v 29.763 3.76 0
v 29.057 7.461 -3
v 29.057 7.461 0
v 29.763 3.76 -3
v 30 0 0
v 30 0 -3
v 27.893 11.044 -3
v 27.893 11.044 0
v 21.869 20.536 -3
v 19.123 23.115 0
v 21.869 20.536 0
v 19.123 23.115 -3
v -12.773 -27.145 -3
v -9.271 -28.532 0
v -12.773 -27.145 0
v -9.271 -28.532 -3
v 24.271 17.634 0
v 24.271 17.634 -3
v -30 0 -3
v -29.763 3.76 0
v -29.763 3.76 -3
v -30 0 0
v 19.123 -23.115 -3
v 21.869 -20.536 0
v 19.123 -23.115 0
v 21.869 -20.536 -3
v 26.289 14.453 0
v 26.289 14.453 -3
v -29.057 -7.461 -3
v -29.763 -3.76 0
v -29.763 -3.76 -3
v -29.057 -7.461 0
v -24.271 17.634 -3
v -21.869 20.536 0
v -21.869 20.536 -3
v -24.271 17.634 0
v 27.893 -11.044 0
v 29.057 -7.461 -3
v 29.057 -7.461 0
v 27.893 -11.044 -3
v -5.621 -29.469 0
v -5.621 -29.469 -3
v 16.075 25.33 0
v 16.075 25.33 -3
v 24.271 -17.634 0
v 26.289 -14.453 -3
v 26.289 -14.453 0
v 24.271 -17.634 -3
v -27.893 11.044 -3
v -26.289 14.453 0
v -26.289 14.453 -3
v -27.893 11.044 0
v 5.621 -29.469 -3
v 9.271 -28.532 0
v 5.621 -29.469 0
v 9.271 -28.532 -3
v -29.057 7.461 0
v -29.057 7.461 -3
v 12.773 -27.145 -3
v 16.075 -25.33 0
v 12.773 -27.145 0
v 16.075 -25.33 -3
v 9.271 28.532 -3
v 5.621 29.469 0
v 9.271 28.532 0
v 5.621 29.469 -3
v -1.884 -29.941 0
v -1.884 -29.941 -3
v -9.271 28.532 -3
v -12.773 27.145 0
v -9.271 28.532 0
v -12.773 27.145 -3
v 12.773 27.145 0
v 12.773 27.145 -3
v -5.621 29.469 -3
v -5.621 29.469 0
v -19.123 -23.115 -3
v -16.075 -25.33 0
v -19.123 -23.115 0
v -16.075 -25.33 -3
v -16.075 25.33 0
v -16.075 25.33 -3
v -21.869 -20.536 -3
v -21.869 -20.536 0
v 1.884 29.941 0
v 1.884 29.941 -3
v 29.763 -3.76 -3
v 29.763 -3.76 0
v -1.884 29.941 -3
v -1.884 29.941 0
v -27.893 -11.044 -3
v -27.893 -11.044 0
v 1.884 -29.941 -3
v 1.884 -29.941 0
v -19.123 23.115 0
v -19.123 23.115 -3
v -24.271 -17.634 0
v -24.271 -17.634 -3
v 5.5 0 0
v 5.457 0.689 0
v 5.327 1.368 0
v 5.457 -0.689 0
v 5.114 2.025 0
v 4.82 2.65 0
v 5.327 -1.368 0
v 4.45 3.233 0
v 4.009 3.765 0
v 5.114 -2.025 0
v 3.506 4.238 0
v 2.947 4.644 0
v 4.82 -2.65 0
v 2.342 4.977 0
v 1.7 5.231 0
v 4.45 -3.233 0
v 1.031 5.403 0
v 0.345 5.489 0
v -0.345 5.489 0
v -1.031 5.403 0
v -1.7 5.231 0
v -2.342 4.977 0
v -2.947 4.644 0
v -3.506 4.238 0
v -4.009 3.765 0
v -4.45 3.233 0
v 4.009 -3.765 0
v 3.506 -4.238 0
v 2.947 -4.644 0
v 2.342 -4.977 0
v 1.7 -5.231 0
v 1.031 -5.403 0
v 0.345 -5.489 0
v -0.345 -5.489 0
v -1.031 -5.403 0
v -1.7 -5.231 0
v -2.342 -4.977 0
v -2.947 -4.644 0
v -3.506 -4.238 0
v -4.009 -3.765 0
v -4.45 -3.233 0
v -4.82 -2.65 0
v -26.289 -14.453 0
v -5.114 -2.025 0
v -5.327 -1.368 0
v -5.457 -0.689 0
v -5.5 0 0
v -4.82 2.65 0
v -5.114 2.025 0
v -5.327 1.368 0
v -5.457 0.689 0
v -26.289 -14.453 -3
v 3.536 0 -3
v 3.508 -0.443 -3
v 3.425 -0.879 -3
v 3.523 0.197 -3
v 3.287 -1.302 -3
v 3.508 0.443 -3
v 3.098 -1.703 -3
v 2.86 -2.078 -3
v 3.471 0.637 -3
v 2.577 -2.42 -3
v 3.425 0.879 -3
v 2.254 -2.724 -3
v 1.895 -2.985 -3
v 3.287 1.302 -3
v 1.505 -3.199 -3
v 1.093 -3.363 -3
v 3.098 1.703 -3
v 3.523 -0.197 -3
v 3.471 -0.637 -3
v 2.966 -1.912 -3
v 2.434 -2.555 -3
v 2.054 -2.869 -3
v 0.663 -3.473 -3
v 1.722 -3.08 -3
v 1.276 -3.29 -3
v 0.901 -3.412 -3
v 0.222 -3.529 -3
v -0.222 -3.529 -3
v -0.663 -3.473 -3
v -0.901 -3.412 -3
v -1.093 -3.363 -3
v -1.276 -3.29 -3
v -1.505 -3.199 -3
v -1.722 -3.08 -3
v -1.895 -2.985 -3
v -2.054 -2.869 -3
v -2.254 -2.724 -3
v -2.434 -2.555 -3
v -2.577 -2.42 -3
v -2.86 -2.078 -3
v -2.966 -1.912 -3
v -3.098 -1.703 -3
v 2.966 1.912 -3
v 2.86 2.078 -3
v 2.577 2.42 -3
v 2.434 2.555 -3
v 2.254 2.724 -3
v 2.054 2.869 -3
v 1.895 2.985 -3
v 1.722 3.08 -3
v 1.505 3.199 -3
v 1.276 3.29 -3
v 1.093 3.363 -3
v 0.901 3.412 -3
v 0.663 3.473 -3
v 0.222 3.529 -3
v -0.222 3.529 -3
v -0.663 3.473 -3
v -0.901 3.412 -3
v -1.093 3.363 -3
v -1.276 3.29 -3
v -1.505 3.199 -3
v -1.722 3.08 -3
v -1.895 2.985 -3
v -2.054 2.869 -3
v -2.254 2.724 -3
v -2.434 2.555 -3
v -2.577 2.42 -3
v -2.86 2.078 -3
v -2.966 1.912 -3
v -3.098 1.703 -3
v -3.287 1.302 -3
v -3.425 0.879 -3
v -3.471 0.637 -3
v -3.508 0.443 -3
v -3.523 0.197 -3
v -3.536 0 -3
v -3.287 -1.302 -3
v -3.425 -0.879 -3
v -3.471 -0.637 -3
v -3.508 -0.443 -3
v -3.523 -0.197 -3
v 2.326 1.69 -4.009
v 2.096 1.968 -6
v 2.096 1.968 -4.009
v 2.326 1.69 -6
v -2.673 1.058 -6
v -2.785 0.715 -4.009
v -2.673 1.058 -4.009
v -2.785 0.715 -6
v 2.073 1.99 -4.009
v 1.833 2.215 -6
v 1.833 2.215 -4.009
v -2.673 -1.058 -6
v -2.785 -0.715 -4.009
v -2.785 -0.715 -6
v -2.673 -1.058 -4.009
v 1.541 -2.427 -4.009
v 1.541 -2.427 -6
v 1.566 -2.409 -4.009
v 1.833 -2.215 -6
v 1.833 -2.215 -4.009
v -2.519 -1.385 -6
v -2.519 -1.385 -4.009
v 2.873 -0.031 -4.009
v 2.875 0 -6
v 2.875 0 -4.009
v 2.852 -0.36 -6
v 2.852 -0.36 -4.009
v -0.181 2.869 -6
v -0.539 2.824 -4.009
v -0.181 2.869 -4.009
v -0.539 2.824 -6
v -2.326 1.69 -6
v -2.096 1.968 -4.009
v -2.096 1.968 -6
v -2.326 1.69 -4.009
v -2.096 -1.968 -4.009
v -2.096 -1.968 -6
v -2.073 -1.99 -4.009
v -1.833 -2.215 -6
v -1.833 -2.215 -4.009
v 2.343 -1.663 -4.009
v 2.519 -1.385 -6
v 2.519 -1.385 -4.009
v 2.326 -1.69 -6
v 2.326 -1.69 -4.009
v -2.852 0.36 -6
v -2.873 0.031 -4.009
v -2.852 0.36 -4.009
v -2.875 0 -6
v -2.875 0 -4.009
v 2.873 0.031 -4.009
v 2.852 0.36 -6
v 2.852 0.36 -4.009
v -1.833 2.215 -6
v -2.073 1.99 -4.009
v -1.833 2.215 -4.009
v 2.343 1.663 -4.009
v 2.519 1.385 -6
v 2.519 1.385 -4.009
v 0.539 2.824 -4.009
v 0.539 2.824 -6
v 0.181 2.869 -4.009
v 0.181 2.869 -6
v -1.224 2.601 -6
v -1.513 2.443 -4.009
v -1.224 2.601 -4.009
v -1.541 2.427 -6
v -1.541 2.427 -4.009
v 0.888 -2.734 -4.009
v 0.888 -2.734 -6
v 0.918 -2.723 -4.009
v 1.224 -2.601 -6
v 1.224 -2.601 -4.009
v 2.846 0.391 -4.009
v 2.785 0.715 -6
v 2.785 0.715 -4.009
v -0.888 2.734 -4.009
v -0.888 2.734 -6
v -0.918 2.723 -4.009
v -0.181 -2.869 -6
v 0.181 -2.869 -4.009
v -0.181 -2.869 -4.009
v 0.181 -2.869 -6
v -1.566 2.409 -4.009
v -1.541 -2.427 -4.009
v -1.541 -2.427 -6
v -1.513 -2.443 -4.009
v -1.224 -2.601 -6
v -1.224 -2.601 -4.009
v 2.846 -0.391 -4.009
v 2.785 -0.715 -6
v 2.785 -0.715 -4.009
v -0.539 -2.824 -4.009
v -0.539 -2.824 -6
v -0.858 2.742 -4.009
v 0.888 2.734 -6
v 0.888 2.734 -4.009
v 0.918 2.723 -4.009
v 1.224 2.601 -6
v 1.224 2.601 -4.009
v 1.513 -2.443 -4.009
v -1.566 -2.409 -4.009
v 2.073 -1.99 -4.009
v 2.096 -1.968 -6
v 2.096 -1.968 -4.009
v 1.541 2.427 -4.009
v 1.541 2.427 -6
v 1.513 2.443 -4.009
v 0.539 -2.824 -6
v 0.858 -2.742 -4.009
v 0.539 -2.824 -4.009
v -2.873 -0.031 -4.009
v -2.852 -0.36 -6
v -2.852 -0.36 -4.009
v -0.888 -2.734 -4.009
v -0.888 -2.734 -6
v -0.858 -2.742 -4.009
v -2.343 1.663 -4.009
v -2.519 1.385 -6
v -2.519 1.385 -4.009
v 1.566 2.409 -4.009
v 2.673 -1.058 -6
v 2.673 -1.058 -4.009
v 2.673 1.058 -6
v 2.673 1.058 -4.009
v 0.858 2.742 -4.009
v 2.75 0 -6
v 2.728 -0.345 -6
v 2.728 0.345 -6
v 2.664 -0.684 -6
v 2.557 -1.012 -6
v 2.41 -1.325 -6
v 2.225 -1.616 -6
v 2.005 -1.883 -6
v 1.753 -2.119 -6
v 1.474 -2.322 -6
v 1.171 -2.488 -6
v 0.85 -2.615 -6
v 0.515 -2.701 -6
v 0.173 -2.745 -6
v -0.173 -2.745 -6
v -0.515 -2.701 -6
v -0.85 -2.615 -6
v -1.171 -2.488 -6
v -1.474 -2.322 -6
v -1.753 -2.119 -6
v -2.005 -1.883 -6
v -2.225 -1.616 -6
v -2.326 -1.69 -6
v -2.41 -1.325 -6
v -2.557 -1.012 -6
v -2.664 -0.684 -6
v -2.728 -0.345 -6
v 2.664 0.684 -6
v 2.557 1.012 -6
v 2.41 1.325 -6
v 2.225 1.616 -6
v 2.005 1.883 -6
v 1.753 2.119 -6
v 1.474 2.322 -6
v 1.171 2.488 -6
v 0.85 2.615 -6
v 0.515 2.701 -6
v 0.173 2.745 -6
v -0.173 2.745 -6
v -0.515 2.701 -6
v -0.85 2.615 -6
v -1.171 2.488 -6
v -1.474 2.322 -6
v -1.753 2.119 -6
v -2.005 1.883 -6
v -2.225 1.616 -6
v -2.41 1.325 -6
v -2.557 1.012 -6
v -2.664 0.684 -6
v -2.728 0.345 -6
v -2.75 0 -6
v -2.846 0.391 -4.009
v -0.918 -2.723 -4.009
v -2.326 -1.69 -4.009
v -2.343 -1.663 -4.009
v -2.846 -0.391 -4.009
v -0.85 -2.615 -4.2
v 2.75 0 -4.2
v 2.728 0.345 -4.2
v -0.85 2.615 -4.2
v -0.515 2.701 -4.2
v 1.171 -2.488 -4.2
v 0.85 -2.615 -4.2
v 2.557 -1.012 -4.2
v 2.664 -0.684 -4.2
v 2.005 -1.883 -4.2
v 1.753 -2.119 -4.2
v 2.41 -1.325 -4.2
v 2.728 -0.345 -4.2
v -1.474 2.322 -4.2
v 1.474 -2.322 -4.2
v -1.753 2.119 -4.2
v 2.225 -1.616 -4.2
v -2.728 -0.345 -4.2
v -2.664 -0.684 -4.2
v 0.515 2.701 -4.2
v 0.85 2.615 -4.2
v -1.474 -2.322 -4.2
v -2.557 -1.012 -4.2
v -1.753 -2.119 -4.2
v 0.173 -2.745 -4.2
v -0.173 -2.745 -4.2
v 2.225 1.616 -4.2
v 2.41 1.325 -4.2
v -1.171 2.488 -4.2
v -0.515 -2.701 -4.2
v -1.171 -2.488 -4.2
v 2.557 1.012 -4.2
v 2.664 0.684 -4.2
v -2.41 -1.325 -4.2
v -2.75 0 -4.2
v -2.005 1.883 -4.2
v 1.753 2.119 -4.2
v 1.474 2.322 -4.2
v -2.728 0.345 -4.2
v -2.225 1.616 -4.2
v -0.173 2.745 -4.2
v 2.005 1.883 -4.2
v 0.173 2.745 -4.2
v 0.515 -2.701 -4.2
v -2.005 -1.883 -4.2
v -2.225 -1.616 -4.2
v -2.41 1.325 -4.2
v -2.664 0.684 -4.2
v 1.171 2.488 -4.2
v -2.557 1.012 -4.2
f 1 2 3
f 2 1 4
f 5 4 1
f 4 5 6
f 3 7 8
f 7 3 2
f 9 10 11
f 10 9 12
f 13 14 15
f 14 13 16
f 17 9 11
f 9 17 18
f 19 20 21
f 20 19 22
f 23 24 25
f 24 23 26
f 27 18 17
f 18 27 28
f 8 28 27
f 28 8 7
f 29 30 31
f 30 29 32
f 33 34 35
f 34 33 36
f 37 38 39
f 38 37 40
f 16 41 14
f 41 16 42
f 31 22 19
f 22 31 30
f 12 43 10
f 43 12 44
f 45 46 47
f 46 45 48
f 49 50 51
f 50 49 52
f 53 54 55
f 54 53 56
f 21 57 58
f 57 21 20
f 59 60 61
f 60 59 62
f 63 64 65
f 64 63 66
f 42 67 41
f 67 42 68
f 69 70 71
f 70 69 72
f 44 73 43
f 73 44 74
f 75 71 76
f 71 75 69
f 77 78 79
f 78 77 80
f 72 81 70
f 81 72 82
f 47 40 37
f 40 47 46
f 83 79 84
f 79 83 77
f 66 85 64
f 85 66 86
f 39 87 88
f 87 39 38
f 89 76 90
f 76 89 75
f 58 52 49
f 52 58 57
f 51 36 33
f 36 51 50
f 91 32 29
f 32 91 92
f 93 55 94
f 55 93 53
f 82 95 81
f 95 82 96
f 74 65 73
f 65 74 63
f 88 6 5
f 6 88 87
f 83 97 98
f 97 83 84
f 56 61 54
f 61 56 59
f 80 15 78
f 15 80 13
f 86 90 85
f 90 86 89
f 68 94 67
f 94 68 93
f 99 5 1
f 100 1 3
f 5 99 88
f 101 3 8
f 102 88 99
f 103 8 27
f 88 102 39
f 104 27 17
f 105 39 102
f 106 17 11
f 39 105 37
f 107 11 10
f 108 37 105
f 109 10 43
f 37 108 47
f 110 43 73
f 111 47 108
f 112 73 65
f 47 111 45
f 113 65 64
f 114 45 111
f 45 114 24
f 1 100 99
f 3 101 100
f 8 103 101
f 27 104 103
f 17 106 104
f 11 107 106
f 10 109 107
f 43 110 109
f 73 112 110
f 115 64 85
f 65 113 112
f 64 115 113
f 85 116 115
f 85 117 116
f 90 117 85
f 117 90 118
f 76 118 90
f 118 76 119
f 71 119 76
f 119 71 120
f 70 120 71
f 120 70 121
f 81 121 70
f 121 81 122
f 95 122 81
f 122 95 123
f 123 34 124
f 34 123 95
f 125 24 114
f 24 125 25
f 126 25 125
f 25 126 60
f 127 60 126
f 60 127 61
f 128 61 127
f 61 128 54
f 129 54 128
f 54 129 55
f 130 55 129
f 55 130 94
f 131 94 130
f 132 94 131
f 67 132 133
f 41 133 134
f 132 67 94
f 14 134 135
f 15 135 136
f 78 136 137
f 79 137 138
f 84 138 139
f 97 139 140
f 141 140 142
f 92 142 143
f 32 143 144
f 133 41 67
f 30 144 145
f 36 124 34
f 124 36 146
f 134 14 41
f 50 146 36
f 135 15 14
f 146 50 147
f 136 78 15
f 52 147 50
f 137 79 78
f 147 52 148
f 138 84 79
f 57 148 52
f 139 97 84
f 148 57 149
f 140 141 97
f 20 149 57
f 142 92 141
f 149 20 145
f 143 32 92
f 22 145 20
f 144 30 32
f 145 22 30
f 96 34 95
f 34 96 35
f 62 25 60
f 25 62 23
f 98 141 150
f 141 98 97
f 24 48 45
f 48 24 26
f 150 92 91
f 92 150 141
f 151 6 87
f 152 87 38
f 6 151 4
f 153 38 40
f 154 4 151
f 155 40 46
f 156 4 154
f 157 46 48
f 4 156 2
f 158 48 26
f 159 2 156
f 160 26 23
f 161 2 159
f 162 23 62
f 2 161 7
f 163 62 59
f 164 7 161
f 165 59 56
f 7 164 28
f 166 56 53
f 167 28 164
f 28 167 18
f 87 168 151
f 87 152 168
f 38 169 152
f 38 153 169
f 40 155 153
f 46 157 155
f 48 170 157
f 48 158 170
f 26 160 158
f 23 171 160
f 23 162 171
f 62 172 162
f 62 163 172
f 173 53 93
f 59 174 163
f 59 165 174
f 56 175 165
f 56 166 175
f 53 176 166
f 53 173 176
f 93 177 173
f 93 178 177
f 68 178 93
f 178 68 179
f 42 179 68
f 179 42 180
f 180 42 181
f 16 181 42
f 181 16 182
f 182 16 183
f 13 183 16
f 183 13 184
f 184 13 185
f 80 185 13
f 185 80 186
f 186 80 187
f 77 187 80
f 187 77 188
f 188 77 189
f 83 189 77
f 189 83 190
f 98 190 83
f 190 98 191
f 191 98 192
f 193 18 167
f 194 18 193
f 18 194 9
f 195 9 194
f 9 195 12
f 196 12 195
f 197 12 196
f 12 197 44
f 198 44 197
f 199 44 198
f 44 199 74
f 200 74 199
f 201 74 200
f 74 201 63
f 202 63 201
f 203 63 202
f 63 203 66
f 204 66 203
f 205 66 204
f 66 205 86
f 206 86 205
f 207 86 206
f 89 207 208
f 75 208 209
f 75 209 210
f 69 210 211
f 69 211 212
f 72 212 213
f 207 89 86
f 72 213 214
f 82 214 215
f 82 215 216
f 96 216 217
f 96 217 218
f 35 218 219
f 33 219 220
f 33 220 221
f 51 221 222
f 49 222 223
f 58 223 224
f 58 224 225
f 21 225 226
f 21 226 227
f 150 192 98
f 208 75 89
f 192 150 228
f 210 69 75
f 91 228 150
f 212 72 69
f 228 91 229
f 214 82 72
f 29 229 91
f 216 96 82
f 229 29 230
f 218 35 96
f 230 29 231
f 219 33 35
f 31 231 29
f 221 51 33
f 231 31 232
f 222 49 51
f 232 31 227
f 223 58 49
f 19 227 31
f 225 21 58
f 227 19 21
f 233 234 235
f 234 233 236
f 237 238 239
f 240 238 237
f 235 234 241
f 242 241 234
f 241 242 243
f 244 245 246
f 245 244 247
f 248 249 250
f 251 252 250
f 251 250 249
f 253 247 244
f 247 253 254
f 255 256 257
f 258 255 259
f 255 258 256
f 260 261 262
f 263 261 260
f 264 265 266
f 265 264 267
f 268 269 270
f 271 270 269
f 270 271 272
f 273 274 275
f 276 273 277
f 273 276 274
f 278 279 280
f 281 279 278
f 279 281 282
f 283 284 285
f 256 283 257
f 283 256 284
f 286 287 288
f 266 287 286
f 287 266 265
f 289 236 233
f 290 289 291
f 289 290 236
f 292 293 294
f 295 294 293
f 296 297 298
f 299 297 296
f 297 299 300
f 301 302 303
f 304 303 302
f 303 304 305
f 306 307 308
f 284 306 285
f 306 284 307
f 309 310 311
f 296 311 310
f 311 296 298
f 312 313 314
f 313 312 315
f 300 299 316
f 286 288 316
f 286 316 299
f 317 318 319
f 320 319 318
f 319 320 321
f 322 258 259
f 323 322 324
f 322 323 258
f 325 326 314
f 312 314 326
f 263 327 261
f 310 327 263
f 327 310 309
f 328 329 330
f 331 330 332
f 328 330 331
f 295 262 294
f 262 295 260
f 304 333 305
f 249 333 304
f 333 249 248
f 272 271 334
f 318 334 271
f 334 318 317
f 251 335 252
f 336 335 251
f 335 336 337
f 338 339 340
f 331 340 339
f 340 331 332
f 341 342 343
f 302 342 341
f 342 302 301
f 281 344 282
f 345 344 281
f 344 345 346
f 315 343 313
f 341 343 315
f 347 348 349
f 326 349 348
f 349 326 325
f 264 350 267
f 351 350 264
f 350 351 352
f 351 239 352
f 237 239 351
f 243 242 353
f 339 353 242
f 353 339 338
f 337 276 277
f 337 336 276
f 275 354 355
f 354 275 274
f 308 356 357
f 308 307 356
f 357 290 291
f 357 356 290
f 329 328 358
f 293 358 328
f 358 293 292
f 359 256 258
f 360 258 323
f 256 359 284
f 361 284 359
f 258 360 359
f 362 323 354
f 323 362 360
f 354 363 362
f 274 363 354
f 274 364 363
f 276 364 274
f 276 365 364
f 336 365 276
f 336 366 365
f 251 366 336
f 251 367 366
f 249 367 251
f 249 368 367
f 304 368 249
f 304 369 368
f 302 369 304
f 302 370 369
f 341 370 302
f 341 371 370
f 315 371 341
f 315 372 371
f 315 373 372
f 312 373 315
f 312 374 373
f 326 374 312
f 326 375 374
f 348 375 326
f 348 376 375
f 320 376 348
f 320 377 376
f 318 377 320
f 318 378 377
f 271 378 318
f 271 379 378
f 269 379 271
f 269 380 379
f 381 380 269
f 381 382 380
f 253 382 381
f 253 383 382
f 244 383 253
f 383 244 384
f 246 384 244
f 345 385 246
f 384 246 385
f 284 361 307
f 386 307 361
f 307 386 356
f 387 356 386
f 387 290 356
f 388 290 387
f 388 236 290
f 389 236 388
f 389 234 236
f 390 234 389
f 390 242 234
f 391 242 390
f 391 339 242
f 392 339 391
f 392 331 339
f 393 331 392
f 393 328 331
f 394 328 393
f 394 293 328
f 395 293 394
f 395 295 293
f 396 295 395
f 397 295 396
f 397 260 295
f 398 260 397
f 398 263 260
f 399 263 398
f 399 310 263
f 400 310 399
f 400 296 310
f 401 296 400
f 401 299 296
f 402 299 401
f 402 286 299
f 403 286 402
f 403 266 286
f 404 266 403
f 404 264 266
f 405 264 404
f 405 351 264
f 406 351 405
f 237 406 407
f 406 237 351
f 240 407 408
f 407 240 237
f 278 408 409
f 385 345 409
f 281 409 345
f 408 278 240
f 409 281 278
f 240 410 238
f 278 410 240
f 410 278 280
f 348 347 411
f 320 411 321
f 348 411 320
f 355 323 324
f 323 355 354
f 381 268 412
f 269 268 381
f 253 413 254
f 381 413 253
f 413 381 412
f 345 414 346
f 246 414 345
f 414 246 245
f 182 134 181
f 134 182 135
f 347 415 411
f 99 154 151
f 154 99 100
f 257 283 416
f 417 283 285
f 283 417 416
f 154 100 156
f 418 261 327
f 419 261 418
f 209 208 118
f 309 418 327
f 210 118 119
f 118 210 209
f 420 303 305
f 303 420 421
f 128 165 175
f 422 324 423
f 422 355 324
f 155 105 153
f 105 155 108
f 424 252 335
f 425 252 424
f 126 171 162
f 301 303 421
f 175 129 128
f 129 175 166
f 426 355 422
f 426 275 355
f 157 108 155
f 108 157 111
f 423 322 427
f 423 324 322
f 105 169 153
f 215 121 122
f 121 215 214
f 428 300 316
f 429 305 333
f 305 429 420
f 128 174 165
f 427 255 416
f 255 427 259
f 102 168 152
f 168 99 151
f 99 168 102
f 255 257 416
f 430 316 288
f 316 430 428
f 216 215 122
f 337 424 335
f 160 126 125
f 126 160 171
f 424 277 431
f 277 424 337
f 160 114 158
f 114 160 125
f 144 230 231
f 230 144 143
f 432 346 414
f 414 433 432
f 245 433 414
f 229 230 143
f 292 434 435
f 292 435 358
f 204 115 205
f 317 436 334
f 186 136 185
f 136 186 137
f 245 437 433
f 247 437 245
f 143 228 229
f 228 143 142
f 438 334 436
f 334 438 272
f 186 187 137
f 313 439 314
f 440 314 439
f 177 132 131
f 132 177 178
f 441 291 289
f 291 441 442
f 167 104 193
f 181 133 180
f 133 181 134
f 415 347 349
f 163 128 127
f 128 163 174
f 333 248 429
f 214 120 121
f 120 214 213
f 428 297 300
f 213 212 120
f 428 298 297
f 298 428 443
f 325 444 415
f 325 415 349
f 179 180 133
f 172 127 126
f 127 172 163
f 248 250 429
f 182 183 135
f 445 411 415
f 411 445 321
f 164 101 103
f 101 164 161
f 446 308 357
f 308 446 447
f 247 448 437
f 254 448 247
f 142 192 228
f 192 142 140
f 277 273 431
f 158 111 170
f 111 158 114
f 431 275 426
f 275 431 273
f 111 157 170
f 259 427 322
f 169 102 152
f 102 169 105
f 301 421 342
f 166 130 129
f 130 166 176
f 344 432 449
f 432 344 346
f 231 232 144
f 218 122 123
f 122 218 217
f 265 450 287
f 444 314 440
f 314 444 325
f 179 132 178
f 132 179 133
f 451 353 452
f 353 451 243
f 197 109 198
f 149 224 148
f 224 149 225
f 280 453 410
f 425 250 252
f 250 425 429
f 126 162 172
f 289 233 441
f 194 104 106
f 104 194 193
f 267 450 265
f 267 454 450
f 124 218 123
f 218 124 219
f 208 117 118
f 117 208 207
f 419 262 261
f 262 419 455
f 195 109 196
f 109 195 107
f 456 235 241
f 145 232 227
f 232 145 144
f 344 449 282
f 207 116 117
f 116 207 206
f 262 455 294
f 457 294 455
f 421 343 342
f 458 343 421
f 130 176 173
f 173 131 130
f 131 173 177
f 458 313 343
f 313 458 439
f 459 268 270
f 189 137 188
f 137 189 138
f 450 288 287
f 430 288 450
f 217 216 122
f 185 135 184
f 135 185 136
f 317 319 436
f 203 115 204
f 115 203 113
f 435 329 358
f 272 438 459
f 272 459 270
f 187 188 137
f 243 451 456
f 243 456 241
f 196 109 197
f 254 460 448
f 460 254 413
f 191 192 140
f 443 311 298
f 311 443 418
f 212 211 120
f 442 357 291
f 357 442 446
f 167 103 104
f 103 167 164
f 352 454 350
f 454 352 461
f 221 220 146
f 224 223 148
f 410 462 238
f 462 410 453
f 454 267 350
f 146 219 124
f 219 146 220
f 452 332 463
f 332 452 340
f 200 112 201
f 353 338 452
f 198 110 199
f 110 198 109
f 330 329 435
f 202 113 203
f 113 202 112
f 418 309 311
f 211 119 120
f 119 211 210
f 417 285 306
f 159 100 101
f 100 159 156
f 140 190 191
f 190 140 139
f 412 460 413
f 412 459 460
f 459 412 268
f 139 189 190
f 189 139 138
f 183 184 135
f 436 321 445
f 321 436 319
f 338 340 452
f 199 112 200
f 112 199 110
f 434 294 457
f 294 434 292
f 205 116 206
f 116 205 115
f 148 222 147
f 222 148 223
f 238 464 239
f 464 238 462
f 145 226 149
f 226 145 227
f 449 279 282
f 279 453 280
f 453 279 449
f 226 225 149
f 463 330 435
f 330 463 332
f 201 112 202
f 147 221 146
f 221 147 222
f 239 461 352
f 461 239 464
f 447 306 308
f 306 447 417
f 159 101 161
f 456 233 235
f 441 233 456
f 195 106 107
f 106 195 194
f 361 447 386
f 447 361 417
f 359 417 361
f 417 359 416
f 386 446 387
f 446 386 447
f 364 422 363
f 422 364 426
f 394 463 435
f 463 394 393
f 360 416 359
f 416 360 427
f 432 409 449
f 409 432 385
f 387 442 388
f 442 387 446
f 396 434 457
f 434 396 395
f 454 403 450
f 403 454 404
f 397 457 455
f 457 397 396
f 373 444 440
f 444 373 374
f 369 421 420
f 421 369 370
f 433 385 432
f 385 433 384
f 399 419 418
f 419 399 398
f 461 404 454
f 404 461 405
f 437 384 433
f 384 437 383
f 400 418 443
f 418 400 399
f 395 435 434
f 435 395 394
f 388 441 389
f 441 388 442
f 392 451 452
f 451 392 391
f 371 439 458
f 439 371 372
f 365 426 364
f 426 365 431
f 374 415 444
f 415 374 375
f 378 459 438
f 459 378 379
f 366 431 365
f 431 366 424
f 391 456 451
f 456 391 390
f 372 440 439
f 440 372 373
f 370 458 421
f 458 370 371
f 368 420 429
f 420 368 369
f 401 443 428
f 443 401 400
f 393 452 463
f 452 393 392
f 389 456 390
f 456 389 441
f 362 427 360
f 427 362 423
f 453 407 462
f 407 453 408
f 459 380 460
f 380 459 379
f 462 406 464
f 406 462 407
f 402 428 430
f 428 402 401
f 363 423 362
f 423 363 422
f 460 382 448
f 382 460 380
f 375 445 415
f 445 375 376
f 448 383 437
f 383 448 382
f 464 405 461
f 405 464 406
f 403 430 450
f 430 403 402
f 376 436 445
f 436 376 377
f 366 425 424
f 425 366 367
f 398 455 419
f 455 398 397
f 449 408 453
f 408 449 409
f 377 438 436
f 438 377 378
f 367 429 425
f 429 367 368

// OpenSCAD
$fn = 50;


difference() {
	union() {
		translate(v = [0, 0, -3.0000000000]) {
			cylinder(h = 3, r = 30.0000000000);
		}
		#translate(v = [0, 0, -6.0000000000]) {
			cylinder(h = 6, r = 2.8750000000);
		}
	}
	union() {
		translate(v = [0, 0, 0]) {
			rotate(a = [0, 0, 0]) {
				difference() {
					union() {
						translate(v = [0, 0, -6.0000000000]) {
							cylinder(h = 6, r = 2.2500000000);
						}
						translate(v = [0, 0, -4.2000000000]) {
							cylinder(h = 4.2000000000, r1 = 2.7500000000, r2 = 5.5000000000);
						}
						translate(v = [0, 0, -6.0000000000]) {
							cylinder(h = 6, r = 2.7500000000);
						}
						translate(v = [0, 0, -6.0000000000]) {
							cylinder(h = 6, r = 2.2500000000);
						}
					}
					union();
				}
			}
		}
	}
}
